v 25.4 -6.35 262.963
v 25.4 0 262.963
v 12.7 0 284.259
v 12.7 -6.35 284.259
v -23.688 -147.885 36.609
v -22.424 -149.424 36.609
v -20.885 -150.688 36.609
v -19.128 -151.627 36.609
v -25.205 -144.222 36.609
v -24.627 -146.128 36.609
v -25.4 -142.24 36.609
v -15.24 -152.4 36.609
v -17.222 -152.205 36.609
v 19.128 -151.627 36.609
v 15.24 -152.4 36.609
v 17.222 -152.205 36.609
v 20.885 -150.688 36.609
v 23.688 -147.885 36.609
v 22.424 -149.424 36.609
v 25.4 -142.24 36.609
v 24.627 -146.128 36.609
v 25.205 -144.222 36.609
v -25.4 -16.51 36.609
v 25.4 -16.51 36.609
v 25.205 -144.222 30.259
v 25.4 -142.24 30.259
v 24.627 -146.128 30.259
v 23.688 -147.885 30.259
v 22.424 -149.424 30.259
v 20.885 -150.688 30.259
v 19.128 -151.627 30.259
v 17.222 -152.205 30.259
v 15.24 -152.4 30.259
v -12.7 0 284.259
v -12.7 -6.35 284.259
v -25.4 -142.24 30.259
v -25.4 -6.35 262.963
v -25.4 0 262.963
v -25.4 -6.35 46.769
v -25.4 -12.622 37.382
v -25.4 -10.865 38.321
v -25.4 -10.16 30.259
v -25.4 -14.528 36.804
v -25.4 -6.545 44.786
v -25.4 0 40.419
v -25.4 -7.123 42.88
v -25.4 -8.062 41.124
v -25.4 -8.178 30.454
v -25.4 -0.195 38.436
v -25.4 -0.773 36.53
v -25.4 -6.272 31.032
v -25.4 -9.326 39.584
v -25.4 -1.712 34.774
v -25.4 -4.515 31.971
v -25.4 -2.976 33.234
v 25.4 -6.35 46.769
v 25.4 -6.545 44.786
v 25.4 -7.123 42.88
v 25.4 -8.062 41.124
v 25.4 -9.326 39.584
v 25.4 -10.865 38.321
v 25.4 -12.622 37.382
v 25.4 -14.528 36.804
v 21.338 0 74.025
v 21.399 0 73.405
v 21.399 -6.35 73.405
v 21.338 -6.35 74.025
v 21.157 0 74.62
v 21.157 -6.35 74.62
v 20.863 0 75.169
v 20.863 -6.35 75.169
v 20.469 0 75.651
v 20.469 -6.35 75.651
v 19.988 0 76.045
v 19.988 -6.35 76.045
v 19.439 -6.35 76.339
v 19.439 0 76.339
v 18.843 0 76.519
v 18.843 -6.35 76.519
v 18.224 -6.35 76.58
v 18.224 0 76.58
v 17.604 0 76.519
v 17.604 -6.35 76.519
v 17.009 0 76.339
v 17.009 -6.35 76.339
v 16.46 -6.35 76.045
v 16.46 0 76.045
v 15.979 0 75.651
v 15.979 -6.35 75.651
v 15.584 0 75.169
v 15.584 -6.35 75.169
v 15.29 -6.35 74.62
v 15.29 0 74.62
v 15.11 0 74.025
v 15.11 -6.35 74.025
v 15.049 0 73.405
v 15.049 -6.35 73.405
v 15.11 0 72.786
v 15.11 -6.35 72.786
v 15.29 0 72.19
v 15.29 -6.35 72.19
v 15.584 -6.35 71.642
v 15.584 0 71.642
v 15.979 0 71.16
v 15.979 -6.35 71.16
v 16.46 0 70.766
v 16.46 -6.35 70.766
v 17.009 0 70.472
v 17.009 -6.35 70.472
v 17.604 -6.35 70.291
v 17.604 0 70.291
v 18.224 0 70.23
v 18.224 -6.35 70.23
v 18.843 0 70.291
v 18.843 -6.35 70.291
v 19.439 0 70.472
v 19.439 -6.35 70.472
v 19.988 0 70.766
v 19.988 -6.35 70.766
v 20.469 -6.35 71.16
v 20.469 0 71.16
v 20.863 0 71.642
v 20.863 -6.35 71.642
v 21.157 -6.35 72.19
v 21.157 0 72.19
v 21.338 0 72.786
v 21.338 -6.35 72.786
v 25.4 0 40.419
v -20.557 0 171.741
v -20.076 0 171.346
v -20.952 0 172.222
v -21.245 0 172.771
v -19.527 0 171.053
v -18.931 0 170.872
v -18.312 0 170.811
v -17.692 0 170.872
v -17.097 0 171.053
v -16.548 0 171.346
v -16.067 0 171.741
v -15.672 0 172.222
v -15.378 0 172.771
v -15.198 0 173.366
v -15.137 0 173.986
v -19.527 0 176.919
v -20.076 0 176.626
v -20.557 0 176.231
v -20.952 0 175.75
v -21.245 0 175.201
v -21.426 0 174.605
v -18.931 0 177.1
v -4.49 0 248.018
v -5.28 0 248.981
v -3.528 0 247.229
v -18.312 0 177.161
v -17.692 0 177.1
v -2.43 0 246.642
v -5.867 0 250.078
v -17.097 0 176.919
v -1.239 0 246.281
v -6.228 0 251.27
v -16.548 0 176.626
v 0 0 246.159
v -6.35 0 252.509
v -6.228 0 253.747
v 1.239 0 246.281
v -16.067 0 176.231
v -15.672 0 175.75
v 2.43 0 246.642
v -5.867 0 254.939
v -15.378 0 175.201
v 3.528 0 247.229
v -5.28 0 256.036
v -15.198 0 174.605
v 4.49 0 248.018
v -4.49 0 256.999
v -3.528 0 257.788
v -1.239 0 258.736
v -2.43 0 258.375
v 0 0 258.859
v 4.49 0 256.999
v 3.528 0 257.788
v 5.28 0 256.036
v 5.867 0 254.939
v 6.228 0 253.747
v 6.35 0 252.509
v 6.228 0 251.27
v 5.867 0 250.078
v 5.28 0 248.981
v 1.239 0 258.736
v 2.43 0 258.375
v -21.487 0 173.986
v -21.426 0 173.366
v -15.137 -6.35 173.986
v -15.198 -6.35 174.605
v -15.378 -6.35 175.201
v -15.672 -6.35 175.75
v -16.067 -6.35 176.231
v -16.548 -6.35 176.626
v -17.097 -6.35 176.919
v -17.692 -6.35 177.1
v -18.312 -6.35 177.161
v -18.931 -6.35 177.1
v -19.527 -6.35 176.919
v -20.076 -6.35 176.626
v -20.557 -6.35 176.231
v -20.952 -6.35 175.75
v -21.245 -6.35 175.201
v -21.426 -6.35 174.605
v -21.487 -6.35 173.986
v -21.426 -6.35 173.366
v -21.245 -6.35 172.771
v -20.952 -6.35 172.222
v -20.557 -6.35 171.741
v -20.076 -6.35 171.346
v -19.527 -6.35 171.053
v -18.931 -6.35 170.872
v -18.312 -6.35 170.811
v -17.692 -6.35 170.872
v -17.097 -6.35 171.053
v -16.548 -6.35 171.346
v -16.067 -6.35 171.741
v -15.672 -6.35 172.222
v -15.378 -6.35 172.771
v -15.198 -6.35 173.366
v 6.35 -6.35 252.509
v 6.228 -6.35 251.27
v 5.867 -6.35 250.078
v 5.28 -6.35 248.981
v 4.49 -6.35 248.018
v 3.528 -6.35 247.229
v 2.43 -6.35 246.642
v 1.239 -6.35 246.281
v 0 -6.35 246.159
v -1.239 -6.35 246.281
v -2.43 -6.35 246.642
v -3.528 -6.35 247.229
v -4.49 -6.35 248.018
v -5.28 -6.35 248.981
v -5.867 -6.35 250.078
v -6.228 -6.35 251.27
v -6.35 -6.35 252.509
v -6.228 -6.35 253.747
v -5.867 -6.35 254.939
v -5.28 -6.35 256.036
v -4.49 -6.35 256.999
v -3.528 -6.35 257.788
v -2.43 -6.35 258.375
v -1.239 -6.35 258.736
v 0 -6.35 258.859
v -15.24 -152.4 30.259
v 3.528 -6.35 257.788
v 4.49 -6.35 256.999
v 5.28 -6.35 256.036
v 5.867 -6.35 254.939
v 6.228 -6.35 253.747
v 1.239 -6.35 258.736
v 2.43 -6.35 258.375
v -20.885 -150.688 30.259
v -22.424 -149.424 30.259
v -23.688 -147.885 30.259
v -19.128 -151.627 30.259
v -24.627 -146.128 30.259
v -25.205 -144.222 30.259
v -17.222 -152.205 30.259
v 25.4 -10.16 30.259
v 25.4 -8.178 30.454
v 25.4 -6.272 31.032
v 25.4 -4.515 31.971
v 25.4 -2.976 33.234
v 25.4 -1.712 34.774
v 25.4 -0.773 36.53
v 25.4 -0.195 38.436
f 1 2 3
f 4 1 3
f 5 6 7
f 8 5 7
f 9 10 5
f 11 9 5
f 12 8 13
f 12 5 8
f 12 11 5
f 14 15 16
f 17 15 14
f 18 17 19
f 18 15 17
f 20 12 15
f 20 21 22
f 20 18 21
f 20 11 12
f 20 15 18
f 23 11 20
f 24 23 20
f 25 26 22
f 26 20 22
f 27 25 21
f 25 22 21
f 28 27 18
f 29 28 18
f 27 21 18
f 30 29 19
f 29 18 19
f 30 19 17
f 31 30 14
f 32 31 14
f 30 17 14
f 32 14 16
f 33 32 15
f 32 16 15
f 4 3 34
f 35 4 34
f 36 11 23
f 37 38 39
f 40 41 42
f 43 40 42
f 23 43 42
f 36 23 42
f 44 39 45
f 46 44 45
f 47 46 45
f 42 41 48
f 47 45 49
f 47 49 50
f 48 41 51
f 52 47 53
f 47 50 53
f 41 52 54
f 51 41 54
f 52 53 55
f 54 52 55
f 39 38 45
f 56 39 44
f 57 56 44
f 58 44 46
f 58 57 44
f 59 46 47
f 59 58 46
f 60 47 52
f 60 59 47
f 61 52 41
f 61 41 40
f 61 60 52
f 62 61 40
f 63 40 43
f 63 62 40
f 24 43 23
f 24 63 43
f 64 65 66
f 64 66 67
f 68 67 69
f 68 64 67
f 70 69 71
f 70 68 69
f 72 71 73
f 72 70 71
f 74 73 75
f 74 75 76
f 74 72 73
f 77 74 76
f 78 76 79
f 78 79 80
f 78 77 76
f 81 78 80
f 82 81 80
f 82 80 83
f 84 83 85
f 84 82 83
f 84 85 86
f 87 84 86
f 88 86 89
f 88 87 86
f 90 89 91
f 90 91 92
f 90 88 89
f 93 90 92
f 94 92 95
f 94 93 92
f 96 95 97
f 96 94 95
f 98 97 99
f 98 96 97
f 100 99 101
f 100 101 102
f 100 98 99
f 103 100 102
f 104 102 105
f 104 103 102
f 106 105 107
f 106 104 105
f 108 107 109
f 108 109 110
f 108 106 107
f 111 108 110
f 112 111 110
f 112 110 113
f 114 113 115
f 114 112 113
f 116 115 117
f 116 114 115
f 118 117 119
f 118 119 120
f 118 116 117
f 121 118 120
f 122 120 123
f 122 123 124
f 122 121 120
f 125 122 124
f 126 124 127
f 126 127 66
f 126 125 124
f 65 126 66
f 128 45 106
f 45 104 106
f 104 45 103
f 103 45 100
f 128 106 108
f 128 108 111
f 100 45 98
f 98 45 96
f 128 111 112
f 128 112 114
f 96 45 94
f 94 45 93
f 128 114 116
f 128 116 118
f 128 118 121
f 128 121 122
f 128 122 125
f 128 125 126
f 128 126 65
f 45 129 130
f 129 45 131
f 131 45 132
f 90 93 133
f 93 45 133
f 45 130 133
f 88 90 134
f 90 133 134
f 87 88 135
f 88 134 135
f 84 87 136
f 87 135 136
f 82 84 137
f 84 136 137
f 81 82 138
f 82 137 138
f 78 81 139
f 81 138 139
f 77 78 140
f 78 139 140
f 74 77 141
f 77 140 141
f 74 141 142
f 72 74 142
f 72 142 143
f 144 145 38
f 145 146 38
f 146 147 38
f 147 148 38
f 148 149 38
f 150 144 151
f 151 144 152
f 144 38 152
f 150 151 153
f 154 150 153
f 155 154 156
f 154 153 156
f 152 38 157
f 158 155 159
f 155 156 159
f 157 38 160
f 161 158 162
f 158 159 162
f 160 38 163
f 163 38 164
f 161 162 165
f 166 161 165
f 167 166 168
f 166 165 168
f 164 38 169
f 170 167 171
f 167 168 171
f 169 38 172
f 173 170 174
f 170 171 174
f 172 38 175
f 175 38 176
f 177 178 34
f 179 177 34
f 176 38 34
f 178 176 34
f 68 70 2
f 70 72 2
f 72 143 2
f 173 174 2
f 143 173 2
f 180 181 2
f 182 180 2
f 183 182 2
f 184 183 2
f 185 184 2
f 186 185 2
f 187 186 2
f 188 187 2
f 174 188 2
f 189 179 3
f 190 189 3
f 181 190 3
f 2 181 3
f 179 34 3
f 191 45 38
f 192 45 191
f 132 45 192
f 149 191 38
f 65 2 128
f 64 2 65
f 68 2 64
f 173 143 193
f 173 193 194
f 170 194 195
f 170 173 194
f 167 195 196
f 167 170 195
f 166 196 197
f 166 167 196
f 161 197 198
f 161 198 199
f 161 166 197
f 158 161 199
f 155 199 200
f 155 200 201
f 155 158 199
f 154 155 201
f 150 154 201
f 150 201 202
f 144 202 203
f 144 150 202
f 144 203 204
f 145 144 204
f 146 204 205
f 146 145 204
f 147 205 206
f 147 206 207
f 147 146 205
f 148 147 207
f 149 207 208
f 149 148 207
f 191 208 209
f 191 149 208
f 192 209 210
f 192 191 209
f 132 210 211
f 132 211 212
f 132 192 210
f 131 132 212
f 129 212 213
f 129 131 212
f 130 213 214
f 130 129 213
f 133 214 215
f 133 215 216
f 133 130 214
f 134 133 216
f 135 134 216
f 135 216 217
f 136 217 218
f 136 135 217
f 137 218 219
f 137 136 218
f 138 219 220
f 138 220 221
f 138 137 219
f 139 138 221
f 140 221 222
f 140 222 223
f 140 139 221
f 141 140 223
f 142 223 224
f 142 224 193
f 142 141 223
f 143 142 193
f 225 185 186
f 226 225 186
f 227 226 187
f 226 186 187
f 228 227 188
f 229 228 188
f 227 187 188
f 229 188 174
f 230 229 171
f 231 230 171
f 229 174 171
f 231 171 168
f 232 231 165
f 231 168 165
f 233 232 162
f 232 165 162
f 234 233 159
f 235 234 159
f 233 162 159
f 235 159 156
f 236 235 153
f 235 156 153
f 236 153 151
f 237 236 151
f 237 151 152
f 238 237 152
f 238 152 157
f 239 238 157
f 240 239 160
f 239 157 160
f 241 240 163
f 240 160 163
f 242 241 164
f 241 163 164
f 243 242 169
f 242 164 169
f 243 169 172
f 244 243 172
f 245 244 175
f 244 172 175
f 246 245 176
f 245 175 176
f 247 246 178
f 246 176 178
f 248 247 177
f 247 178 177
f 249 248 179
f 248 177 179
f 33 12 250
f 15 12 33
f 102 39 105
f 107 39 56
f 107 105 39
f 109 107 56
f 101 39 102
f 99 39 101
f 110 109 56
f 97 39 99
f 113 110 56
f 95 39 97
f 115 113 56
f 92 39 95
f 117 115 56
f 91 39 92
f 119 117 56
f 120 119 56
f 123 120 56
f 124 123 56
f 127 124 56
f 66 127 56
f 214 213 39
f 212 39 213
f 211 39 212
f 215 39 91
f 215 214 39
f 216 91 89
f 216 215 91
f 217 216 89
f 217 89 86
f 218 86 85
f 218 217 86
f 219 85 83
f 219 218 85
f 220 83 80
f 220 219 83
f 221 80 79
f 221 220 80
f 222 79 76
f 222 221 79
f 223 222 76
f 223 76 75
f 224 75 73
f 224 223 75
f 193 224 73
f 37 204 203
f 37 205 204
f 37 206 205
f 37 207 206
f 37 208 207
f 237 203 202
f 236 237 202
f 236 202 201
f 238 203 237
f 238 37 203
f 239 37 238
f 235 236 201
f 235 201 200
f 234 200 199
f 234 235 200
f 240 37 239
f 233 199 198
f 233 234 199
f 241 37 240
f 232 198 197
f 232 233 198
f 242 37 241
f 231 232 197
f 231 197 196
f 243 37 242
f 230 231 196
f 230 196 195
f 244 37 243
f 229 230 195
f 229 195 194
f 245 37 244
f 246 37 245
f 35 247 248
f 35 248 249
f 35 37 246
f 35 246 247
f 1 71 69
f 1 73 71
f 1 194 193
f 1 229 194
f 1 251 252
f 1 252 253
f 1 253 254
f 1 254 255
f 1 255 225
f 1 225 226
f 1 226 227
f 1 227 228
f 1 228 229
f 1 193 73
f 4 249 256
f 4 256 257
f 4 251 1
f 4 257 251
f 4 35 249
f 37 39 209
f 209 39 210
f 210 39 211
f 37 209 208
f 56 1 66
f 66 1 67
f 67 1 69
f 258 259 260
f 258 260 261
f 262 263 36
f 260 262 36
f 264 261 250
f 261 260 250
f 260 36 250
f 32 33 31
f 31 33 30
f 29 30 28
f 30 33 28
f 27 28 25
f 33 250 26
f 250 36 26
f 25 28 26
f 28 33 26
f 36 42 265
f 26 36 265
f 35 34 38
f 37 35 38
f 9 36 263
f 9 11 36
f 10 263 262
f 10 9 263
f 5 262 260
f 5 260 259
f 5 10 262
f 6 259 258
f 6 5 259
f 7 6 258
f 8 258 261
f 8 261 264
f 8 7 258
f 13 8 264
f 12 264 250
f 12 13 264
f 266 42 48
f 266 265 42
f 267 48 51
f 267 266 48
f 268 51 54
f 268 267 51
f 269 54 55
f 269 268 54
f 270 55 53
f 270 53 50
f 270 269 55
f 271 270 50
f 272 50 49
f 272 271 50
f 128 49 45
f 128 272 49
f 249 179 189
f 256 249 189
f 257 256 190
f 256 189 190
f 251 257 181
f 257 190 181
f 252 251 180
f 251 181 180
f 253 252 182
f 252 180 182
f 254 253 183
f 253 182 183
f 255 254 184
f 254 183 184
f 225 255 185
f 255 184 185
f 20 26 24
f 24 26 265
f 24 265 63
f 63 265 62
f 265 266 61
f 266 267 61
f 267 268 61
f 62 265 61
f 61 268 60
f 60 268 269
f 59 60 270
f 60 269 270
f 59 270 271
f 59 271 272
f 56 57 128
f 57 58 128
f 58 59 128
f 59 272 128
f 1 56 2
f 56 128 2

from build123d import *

# Parameters (mm, degrees)
F0_W     = 50.8
F0_H     = 6.35
F1_DEPTH = 152.4
F0_R     = 3.175
F2_DEPTH = 6.35
F3_R     = 10.16
F4_R     = 10.16


with BuildPart() as f1:
    # F0 (on Front) → F1 (new body)
    with BuildSketch(Plane.XZ):
        with Locations((0, 33.433512)):
            Rectangle(F0_W, F0_H)
    extrude(amount=F1_DEPTH)

    # F0 (on Front) → F2 (join)
    with BuildSketch(Plane.XZ):
        Polygon((-12.7, 284.258512), (-25.4, 262.963444), (-25.4, 36.608512), (25.4, 36.608512), (25.4, 262.963444), (12.7, 284.258512), (0, 284.258512), align=None)
        with Locations((18.223565, 73.40546)):
            Circle(F0_R, mode=Mode.SUBTRACT)
        with Locations((-18.311808, 173.985869)):
            Circle(F0_R, mode=Mode.SUBTRACT)
        with BuildLine():
            ThreePointArc((6.35, 252.508512), (-4.490128, 248.018384), (0, 258.858512))
            ThreePointArc((0, 258.858512), (4.490128, 256.99864), (6.35, 252.508512))
        make_face(mode=Mode.SUBTRACT)
    extrude(amount=F2_DEPTH)

    # F3
    f3_edges = [f1.edges().sort_by_distance(p)[0] for p in [
        (0, -6.35, 36.608512),
        (0, 0, 30.258512),
    ]]
    fillet(f3_edges, radius=F3_R)

    # F4
    f4_edges = [f1.edges().sort_by_distance(p)[0] for p in [
        (-25.4, -152.4, 33.433512),
        (25.4, -152.4, 33.433512),
    ]]
    fillet(f4_edges, radius=F4_R)


solid = f1.part
